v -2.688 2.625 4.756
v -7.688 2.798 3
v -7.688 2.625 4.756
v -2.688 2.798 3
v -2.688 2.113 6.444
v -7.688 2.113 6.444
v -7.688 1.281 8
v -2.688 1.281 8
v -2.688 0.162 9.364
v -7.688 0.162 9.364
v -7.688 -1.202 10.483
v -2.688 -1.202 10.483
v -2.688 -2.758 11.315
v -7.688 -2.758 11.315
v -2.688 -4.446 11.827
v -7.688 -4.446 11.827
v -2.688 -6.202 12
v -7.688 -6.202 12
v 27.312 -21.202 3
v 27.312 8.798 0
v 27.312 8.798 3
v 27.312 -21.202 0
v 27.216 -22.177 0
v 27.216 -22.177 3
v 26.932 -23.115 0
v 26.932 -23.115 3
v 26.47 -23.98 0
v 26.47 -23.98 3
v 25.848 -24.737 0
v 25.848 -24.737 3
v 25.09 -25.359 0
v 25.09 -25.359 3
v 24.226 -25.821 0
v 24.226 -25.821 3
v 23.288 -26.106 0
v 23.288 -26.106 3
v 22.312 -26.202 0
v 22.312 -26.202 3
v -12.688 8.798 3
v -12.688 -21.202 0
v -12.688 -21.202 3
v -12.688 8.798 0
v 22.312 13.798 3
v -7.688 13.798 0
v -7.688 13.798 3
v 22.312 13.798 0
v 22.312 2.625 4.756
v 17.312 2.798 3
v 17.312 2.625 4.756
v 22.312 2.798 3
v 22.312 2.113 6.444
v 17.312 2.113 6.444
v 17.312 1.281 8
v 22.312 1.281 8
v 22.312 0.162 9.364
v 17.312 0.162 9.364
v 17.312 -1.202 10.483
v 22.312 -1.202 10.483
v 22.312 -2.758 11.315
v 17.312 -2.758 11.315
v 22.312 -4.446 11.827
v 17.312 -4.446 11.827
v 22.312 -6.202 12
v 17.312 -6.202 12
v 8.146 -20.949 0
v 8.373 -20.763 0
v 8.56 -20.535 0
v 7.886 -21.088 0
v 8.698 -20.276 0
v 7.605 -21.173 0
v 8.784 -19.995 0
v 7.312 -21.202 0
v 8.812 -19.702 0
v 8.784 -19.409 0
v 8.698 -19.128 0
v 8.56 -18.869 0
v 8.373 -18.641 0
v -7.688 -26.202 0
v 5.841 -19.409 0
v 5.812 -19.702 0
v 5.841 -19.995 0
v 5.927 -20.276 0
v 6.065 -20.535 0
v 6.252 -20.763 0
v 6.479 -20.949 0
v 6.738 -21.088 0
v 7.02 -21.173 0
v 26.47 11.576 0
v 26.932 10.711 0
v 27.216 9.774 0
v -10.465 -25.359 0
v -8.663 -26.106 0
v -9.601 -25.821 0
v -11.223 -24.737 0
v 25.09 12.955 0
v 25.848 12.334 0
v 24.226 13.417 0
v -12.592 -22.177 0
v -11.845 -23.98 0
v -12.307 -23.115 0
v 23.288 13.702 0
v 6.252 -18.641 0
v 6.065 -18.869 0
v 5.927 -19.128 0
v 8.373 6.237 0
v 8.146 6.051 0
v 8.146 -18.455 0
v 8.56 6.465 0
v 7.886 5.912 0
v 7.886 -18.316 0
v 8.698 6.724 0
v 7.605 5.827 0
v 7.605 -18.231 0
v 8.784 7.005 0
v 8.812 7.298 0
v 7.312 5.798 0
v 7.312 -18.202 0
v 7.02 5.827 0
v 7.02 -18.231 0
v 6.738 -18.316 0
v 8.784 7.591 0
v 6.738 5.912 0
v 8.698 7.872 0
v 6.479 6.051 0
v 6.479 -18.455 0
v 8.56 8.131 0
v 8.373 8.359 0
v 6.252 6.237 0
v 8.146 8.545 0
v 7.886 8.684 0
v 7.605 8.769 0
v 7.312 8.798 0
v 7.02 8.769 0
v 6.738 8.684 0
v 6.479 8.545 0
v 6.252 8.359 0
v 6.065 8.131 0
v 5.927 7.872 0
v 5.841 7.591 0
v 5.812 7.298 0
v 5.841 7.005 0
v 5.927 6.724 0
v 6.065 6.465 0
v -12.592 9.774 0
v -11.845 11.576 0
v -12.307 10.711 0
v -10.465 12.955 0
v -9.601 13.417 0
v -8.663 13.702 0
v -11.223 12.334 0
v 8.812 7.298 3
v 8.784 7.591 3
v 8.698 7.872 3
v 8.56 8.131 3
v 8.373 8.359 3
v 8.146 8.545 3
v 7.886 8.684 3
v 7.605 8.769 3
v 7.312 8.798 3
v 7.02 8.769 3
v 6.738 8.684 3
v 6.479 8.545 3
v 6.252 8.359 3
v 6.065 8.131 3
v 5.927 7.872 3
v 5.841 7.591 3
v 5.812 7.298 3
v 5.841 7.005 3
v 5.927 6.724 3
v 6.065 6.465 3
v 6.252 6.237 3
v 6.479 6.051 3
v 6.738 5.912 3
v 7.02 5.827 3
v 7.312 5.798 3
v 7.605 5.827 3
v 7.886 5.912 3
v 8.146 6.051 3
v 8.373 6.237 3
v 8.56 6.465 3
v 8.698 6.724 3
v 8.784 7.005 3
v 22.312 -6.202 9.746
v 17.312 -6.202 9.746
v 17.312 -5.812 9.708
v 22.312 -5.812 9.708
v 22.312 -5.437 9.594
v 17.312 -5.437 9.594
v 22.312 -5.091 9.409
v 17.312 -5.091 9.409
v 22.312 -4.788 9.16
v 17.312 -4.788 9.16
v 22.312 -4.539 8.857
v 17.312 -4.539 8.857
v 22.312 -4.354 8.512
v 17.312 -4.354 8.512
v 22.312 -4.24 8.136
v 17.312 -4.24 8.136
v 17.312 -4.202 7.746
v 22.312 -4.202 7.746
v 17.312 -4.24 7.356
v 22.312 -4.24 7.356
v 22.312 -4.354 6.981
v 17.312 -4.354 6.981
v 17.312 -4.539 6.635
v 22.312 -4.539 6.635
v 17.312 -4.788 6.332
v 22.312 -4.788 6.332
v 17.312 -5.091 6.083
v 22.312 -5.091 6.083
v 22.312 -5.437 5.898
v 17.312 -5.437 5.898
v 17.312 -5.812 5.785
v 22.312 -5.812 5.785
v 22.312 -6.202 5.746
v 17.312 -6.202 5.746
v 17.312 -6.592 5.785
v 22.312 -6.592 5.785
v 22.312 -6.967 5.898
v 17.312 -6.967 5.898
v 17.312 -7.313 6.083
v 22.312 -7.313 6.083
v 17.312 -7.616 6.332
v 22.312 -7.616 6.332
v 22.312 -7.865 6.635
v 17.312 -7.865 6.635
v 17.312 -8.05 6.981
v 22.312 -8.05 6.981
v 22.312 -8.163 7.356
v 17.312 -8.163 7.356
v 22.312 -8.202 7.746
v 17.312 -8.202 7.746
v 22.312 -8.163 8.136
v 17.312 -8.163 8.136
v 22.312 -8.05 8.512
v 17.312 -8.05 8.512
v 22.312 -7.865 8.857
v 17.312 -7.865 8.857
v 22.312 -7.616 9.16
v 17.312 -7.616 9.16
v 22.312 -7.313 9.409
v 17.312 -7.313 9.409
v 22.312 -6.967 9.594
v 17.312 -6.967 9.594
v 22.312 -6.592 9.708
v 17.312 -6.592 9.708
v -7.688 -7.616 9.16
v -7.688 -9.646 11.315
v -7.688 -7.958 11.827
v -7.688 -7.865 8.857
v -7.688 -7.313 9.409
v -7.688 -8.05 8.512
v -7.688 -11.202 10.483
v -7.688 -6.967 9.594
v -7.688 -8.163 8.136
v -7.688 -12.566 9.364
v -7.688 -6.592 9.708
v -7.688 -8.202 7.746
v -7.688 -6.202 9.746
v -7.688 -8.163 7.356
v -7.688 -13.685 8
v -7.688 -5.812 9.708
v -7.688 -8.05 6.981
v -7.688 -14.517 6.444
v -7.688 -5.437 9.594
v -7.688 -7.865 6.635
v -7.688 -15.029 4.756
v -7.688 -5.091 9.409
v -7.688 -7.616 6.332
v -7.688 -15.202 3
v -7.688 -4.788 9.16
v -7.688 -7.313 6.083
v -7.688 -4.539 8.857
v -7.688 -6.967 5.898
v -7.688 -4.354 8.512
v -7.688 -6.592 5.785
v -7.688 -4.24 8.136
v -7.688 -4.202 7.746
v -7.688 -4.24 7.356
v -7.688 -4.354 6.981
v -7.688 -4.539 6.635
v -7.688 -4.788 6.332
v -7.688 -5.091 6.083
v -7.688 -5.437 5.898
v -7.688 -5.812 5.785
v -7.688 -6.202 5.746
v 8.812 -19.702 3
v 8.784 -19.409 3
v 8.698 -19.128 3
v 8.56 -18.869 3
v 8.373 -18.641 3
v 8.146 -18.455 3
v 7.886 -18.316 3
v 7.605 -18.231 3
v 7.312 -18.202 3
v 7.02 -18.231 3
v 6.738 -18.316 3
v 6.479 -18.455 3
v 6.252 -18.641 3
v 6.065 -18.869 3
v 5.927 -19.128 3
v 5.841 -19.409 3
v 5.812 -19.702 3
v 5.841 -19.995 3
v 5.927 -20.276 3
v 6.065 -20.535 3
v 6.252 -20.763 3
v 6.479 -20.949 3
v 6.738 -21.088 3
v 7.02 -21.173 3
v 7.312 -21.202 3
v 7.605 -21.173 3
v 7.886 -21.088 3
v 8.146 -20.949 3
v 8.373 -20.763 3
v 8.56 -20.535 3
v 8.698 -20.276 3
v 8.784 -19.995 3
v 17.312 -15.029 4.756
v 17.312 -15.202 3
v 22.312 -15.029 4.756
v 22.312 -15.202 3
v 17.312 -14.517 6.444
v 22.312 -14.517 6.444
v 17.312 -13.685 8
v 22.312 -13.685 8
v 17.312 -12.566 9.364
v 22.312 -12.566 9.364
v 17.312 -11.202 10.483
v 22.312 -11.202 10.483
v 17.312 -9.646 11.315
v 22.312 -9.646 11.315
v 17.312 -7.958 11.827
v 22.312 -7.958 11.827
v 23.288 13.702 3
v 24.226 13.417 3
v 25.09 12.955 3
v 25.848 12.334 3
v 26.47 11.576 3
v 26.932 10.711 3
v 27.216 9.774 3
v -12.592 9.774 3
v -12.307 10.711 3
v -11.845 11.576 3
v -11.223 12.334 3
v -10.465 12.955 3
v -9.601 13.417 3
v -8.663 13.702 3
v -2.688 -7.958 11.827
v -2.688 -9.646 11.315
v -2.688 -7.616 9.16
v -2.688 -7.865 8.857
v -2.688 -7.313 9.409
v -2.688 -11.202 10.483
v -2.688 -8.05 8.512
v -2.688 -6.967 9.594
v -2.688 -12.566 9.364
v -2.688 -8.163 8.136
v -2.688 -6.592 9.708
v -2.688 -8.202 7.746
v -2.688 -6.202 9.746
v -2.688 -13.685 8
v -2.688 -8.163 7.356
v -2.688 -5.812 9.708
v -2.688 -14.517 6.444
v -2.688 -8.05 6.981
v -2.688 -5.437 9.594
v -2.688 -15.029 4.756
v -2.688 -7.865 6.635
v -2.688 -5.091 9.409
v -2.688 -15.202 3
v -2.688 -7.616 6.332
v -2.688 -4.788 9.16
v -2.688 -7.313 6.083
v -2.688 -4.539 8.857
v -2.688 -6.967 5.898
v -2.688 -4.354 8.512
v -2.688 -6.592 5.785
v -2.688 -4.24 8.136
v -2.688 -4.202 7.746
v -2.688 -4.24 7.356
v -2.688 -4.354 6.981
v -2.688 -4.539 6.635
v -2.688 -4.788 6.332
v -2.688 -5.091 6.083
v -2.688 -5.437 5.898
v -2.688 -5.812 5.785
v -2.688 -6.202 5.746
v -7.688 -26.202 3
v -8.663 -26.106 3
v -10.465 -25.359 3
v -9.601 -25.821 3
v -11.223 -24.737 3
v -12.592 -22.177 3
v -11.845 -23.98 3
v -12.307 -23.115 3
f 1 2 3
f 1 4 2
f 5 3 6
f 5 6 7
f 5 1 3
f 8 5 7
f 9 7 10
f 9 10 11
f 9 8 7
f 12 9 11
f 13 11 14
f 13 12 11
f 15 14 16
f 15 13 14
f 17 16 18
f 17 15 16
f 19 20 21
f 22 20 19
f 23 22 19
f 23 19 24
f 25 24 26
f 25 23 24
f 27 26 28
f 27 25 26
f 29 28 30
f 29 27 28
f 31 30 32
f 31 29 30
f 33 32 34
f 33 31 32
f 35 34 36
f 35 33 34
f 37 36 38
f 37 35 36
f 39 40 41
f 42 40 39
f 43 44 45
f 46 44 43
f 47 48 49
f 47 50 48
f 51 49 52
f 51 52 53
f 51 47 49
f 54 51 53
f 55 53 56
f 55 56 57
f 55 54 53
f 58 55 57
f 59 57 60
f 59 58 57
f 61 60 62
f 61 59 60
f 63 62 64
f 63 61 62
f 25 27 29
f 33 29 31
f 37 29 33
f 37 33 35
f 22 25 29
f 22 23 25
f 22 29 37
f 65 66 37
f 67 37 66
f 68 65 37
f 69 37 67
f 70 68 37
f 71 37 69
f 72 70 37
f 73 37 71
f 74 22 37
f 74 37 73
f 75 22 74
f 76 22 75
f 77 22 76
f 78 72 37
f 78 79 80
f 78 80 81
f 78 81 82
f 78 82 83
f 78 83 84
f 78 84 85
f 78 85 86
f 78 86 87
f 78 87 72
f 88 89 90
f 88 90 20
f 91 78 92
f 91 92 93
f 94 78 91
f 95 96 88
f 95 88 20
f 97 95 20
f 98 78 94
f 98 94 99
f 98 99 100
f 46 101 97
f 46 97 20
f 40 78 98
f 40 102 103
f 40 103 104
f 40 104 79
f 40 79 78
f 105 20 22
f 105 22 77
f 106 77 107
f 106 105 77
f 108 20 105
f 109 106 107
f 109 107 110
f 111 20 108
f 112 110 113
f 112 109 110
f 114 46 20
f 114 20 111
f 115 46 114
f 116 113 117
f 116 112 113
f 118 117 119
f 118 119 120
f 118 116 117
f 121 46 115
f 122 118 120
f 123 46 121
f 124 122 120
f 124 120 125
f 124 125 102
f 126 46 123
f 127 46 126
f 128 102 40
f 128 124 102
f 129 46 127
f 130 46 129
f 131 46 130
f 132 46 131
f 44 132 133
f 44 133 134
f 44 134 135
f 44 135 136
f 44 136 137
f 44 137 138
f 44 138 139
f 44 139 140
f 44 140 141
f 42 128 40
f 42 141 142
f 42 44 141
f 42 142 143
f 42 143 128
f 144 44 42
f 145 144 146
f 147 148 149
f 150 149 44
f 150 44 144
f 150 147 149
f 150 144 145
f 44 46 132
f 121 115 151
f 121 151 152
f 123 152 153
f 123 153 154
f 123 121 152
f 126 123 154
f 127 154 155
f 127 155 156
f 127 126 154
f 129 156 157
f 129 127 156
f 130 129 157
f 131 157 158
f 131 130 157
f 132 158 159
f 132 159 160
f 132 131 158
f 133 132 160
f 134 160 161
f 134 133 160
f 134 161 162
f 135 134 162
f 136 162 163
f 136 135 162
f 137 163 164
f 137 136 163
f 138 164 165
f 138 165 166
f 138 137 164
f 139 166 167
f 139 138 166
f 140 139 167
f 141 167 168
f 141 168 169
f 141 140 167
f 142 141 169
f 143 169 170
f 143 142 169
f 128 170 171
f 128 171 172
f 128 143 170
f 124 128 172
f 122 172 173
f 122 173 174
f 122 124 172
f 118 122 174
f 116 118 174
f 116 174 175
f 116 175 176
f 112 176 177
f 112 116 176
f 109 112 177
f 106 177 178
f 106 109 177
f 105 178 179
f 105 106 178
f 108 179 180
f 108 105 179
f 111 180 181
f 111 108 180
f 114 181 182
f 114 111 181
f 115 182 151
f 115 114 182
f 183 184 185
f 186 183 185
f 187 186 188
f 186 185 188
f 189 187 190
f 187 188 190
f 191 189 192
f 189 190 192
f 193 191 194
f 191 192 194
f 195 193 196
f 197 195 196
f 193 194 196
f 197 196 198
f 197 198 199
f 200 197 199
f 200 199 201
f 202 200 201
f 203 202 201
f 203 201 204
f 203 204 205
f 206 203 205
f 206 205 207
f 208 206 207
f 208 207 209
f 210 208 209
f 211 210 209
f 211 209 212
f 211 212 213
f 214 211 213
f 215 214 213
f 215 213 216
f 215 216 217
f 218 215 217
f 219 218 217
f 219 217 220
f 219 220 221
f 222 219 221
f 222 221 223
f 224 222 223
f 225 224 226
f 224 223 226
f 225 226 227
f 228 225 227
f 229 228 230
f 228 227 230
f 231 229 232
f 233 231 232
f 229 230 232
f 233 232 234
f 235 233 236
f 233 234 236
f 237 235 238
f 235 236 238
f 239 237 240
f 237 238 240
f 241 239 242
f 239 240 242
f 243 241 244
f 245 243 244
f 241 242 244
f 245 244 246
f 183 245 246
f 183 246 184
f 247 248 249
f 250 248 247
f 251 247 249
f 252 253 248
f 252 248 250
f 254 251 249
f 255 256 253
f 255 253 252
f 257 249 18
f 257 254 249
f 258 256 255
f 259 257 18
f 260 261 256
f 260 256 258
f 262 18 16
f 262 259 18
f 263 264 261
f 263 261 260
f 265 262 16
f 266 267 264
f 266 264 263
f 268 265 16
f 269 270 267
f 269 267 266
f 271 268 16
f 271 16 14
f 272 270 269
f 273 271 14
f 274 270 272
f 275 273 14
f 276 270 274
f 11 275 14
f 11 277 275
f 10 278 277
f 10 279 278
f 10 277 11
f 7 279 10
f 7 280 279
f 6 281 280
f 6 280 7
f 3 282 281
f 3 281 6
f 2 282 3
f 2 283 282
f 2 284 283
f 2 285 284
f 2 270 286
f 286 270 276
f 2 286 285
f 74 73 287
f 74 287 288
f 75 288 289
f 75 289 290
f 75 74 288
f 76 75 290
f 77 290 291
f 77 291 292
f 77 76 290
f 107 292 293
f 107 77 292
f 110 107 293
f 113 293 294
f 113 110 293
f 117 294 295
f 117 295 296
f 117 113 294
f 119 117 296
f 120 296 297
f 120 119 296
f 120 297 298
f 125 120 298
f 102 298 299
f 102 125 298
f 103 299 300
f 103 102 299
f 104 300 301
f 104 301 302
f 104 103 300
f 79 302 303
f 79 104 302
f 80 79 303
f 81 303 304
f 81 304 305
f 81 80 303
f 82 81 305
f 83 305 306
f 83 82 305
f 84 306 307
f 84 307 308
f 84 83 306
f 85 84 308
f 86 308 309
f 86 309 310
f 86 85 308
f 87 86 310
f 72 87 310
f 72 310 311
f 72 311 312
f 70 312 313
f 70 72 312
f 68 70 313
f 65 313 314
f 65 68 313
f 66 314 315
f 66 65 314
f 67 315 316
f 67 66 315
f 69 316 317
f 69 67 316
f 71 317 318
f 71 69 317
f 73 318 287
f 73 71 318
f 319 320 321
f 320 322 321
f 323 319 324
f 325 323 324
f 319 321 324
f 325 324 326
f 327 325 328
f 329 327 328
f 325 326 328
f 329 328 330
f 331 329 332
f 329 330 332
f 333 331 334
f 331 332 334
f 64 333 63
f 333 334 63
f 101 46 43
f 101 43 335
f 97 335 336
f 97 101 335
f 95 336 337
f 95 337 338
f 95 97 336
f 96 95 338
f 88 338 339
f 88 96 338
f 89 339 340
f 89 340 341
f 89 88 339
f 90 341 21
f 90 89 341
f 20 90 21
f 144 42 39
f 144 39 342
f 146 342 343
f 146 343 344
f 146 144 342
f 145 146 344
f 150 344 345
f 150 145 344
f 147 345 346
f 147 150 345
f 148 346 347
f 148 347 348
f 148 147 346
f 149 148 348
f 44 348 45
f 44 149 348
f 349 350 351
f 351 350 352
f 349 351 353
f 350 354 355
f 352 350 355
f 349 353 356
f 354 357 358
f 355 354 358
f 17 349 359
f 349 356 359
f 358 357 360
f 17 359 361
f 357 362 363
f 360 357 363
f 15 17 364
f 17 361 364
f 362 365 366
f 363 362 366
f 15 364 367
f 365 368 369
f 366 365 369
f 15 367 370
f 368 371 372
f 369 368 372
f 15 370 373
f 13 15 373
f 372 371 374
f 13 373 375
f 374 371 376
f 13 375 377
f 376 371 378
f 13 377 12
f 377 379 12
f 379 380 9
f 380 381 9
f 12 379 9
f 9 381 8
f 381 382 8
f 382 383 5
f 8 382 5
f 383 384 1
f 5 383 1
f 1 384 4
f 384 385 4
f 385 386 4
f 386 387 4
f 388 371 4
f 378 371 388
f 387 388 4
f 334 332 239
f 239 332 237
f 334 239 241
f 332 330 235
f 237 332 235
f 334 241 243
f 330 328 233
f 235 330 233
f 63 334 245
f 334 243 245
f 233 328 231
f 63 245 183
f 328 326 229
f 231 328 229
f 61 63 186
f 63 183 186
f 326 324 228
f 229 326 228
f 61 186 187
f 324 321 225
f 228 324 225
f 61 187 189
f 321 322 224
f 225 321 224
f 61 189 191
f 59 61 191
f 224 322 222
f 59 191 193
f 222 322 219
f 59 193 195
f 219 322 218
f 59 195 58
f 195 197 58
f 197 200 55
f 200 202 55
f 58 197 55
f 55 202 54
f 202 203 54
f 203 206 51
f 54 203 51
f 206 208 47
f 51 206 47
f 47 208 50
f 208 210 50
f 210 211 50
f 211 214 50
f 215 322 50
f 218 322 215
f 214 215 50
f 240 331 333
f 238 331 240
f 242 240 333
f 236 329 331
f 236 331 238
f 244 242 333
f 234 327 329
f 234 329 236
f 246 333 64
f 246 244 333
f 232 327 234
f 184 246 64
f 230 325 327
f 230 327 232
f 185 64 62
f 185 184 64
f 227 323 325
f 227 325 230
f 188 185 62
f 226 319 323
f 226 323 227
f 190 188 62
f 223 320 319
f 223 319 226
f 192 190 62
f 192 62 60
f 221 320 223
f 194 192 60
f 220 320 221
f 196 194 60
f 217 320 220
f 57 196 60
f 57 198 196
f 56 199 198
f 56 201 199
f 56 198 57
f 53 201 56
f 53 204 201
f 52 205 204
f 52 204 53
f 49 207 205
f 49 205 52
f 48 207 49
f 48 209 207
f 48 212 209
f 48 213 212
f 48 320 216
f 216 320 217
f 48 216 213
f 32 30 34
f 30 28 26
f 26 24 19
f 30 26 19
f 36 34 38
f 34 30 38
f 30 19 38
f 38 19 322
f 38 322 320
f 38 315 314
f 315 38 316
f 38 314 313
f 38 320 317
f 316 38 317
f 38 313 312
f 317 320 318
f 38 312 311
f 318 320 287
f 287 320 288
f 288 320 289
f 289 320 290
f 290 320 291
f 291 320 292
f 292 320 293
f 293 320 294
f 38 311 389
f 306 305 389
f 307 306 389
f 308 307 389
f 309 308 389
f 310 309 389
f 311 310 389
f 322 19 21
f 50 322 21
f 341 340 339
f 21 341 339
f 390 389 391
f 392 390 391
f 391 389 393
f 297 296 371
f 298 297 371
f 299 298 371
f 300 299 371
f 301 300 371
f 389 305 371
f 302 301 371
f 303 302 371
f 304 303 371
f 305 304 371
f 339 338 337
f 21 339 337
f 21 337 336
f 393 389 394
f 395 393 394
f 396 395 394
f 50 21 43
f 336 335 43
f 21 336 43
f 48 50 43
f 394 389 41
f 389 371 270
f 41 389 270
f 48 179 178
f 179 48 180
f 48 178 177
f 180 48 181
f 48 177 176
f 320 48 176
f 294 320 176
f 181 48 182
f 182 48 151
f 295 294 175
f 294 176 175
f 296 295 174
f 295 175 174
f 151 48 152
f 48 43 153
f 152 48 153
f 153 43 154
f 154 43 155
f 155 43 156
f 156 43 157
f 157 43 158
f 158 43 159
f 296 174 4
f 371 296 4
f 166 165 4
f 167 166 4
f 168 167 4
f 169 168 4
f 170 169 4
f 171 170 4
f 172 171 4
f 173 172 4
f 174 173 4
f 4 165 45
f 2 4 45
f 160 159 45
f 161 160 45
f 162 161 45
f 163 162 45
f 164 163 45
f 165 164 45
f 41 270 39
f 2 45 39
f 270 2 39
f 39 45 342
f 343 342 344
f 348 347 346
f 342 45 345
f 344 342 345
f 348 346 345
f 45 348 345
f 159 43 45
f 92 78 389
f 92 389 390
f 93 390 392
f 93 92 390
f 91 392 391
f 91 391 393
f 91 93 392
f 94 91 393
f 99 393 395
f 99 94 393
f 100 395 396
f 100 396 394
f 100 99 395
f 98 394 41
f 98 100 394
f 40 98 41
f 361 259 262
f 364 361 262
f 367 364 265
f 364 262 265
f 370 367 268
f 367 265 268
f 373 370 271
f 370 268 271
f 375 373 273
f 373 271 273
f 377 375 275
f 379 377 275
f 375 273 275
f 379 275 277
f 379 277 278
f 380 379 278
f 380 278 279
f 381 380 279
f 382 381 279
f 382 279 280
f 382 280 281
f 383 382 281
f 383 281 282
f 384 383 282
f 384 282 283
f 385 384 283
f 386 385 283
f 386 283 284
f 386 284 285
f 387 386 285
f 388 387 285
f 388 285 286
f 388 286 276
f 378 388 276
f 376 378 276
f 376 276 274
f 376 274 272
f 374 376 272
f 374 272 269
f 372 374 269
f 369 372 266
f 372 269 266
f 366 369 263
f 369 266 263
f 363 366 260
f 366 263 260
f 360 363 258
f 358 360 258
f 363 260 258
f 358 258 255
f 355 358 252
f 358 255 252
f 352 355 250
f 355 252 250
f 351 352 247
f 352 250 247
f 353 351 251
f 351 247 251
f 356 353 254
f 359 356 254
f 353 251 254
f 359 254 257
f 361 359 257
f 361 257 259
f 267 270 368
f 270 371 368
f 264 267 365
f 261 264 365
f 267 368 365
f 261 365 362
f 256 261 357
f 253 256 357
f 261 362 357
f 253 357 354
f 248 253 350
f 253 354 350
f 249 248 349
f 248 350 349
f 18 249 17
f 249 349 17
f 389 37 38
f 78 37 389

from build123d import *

# Parameters (mm, degrees)
CROQUIS1_R              = 1.5
SALIENTE_EXTRUIR1_DEPTH = 3
SALIENTE_EXTRUIR2_START = 3
CROQUIS2_W              = 5
CROQUIS2_H              = 18
SALIENTE_EXTRUIR2_DEPTH = 9
REDONDEO6_R             = 9
REDONDEO7_R             = 9
CORTAR_EXTRUIR1_REACH   = 47.338
CROQUIS3_R              = 2


with BuildPart() as part:
    # Croquis1 → Saliente-Extruir1 (new body)
    with BuildSketch(Plane.XY):
        with BuildLine():
            Line((-7.68763367, 13.798076923), (22.31236633, 13.798076923))
            ThreePointArc((22.31236633, 13.798076923), (25.847900236, 12.333610829), (27.31236633, 8.798076923))
            Line((27.31236633, 8.798076923), (27.31236633, -21.201923077))
            ThreePointArc((27.31236633, -21.201923077), (25.847900236, -24.737456983), (22.31236633, -26.201923077))
            Line((22.31236633, -26.201923077), (-7.68763367, -26.201923077))
            ThreePointArc((-7.68763367, -26.201923077), (-11.223167576, -24.737456983), (-12.68763367, -21.201923077))
            Line((-12.68763367, -21.201923077), (-12.68763367, 8.798076923))
            ThreePointArc((-12.68763367, 8.798076923), (-11.223167576, 12.333610829), (-7.68763367, 13.798076923))
        make_face()
        with Locations((7.31236633, 7.298076923)):
            Circle(CROQUIS1_R, mode=Mode.SUBTRACT)
        with Locations((7.31236633, -19.701923077)):
            Circle(CROQUIS1_R, mode=Mode.SUBTRACT)
    extrude(amount=SALIENTE_EXTRUIR1_DEPTH)

    # Croquis2 → Saliente-Extruir2 (add)
    with BuildSketch(Plane.XY.offset(SALIENTE_EXTRUIR2_START)):
        with Locations((-5.18763367, -6.201923077)):
            Rectangle(CROQUIS2_W, CROQUIS2_H)
        with Locations((19.81236633, -6.201923077)):
            Rectangle(CROQUIS2_W, CROQUIS2_H)
    extrude(amount=SALIENTE_EXTRUIR2_DEPTH)

    # Redondeo6
    redondeo6_edges = [part.edges().sort_by_distance(p)[0] for p in [
        (-5.18763367, 2.798076923, 12),
        (-5.18763367, -15.201923077, 12),
    ]]
    fillet(redondeo6_edges, radius=REDONDEO6_R - 0.0001)  # a hair under: the kernel refuses the full size

    # Redondeo7
    redondeo7_edges = [part.edges().sort_by_distance(p)[0] for p in [
        (19.81236633, -15.201923077, 12),
        (19.81236633, 2.798076923, 12),
    ]]
    fillet(redondeo7_edges, radius=REDONDEO7_R - 0.0001)  # a hair under: the kernel refuses the full size

    # Cortar-Extruir1: up to this face of the body (flat: up to its plane)
    cortar_extruir1_end = Plane(part.part.faces().sort_by_distance((22.31236633, -6.201923077, 6.819731779))[0])
    # Croquis3 → Cortar-Extruir1 (cut, up to the picked face)
    with BuildSketch(Plane.ZY.offset(7.68763367), mode=Mode.PRIVATE) as cortar_extruir1_sk1:
        with Locations((7.74625312, -6.201923077)):
            Circle(CROQUIS3_R)
    cortar_extruir1_tool1 = split(extrude(cortar_extruir1_sk1.sketch, amount=-CORTAR_EXTRUIR1_REACH, mode=Mode.PRIVATE), bisect_by=cortar_extruir1_end, keep=Keep.BOTH, mode=Mode.PRIVATE)
    add(cortar_extruir1_tool1.solids().sort_by(Axis((-7.687634, -6.201923, 7.746253), (1, 0, 0)))[0], mode=Mode.SUBTRACT)


solid = part.part
